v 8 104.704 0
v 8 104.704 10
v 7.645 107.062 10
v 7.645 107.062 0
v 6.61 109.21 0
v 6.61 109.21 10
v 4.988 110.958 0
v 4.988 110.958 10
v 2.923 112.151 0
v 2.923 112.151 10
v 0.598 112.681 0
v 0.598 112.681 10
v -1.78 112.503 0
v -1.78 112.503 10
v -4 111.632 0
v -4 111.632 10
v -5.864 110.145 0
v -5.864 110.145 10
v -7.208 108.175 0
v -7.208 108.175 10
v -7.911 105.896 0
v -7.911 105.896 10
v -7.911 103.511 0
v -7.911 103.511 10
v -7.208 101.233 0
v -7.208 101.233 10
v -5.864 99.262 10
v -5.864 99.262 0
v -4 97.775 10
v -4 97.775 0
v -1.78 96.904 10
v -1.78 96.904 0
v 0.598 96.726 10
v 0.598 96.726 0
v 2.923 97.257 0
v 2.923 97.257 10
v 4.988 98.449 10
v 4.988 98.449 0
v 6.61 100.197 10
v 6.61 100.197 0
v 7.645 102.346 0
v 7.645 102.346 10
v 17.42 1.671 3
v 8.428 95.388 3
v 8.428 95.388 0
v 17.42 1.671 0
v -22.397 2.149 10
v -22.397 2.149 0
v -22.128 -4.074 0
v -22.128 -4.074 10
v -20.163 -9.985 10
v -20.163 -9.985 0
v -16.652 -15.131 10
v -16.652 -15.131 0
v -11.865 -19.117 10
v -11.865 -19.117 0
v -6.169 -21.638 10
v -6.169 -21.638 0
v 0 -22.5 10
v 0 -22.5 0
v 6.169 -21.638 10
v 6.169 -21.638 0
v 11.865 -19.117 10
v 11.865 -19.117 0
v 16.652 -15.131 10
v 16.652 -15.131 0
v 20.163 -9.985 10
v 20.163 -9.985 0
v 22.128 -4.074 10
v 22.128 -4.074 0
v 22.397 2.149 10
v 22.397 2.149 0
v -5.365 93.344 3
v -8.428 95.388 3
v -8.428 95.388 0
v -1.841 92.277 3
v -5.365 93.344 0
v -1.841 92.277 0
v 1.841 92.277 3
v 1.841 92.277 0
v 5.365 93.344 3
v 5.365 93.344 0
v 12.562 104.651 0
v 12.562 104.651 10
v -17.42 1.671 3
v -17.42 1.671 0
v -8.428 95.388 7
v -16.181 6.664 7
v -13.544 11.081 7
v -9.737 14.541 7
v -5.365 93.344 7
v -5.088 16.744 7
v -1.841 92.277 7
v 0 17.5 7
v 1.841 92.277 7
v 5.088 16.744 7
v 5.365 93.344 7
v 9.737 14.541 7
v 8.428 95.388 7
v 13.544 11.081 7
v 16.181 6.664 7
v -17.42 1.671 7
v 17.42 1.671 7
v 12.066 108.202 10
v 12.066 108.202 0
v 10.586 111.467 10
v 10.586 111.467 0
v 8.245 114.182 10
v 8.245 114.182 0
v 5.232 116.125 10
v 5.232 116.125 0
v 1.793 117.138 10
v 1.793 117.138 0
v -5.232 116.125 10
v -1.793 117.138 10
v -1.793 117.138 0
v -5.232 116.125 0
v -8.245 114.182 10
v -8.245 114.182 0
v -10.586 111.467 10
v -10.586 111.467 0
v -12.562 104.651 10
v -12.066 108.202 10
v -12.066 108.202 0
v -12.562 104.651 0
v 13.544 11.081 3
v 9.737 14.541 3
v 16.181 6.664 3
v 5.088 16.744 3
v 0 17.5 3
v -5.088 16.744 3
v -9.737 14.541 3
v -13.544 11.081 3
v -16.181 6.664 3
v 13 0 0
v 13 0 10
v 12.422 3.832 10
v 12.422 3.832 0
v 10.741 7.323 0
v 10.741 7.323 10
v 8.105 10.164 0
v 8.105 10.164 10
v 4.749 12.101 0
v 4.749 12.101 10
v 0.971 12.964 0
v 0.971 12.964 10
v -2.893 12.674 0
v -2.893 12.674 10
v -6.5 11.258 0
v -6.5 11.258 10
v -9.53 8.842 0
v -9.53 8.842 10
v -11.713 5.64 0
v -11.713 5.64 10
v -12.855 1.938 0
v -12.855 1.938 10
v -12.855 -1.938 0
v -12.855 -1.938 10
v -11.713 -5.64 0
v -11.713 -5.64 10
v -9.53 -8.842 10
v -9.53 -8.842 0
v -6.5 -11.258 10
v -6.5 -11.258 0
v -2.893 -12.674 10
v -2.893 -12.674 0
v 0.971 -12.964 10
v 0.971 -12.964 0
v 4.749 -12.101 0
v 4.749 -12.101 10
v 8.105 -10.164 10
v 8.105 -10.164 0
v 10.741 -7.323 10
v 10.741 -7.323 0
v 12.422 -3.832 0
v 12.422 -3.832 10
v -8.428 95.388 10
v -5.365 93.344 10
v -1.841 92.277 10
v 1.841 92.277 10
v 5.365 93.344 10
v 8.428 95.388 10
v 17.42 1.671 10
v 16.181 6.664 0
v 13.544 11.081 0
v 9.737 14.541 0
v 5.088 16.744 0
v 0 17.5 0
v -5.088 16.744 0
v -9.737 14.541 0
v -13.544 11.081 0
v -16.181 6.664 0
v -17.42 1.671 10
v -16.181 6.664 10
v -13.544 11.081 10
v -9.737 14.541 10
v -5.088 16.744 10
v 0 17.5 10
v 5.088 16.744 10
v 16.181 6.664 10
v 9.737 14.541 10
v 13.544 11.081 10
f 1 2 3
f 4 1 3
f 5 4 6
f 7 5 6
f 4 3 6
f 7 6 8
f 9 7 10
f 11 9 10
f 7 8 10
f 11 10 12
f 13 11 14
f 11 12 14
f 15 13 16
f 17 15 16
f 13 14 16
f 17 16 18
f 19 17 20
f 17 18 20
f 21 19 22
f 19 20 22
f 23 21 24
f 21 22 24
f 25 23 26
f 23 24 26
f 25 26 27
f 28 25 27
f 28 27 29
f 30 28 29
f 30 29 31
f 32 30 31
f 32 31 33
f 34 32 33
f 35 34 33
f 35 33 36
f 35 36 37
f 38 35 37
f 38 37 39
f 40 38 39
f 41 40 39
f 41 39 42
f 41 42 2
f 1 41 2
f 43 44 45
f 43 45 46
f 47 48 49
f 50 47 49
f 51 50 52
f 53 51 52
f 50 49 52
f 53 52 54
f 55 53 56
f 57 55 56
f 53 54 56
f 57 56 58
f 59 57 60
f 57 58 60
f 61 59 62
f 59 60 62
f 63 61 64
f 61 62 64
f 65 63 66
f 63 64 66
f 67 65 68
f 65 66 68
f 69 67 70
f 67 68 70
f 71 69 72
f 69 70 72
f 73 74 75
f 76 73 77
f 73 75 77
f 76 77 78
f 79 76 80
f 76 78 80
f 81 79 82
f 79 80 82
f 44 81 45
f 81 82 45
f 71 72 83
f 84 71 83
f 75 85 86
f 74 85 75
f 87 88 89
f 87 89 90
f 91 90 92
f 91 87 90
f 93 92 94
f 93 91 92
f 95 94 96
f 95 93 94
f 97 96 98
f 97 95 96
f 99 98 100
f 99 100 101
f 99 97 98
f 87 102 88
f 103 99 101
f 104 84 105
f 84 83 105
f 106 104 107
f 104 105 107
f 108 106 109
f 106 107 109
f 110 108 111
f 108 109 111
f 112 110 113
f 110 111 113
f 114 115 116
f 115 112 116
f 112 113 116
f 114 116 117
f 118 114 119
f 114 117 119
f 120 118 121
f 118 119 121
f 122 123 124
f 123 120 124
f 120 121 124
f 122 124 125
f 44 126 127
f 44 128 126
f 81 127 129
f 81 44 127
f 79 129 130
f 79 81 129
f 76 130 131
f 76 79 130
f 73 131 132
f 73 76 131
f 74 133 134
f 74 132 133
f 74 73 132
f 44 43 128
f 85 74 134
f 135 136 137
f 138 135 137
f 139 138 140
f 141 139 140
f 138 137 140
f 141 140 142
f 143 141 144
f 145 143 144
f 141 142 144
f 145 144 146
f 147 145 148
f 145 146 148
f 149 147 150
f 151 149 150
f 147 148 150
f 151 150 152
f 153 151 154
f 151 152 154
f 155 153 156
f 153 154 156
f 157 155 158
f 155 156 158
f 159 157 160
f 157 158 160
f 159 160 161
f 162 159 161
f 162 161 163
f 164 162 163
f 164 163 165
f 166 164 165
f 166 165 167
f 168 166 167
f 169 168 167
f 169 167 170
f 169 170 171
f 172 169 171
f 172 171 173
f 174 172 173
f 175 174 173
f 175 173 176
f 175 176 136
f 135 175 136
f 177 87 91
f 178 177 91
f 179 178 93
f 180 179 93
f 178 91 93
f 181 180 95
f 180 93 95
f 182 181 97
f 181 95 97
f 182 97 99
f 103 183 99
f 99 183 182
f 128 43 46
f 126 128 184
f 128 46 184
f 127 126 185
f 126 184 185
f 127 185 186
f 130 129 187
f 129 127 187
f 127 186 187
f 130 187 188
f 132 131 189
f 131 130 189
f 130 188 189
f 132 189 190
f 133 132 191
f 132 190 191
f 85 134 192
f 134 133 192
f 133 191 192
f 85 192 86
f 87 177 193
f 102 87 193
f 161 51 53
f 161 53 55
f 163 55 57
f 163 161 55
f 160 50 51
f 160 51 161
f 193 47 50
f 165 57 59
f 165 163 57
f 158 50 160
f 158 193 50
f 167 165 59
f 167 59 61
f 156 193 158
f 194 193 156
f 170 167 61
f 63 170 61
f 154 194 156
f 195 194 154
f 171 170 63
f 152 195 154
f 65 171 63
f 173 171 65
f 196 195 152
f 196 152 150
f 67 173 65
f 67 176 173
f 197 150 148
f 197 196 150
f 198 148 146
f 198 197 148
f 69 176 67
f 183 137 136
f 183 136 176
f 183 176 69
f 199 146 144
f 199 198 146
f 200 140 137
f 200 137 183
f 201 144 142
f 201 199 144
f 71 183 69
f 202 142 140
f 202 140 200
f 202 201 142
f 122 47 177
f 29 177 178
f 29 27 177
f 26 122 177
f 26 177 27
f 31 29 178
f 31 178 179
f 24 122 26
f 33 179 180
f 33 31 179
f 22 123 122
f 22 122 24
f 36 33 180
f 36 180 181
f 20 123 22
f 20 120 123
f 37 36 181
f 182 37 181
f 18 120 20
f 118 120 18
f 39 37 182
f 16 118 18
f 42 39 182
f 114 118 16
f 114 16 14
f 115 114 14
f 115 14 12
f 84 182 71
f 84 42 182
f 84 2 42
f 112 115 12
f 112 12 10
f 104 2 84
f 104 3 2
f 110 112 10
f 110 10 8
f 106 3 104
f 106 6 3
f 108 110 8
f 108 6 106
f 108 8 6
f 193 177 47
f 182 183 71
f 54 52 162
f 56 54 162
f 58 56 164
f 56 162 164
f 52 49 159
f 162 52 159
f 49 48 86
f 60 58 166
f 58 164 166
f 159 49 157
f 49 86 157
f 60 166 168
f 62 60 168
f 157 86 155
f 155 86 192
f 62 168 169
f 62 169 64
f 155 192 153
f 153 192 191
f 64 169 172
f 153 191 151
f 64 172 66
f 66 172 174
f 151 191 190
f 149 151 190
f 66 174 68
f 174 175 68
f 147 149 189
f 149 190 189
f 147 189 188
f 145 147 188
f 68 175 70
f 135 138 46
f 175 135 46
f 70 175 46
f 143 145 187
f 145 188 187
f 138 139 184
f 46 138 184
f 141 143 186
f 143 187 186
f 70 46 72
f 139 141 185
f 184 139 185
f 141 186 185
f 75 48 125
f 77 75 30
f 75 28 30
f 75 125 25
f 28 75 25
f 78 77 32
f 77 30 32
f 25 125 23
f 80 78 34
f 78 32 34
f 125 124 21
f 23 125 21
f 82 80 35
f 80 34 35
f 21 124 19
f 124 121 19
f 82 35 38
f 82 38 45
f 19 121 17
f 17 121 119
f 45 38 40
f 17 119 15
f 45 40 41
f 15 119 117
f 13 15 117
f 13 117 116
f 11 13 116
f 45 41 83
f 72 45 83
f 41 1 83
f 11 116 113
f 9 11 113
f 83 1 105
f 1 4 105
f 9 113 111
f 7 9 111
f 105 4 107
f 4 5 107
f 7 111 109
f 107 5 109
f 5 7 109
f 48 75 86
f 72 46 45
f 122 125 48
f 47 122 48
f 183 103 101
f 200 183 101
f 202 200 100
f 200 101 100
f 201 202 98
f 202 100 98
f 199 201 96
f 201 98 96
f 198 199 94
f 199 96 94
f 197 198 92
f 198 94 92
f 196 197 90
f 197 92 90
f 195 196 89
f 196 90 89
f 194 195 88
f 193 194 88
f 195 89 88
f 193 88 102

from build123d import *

# Parameters (mm, degrees)
BOSS_EXTRUDE1_DEPTH = 10
CUT_EXTRUDE1_DEPTH  = 3
CUT_EXTRUDE2_START  = -3
CUT_EXTRUDE2_DEPTH  = 3
SKETCH8_R           = 17.5
SKETCH8_R_2         = 12.562549016
BOSS_EXTRUDE3_DEPTH = 10
SKETCH9_R           = 13
SKETCH9_R_2         = 8
CUT_EXTRUDE4_DEPTH  = 120.823194953


with BuildPart() as part:
    # Sketch2 → Boss-Extrude1 (new body)
    with BuildSketch(Plane.XY):
        with BuildLine():
            Line((-12.442858632, 105.897439267), (-22.397145538, 2.148923391))
            ThreePointArc((-22.397145538, 2.148923391), (0, -22.5), (22.397145538, 2.148923391))
            Line((22.397145538, 2.148923391), (12.442858632, 105.897439267))
            ThreePointArc((12.442858632, 105.897439267), (0, 117.203592938), (-12.442858632, 105.897439267))
        make_face()
    extrude(amount=BOSS_EXTRUDE1_DEPTH)

    # Sketch3 → Cut-Extrude1 (cut)
    with BuildSketch(Plane.XY.offset(10)):
        with BuildLine():
            Line((-7.465715179, 105.419900735), (-17.420002085, 1.67138486))
            ThreePointArc((-17.420002085, 1.67138486), (0, -17.5), (17.420002085, 1.67138486))
            Line((17.420002085, 1.67138486), (7.465715179, 105.419900735))
            ThreePointArc((7.465715179, 105.419900735), (0, 112.203592938), (-7.465715179, 105.419900735))
        make_face()
    extrude(amount=-CUT_EXTRUDE1_DEPTH, mode=Mode.SUBTRACT)

    # Sketch5 → Cut-Extrude2 (cut)
    with BuildSketch(Plane(origin=(0, 0, 0), x_dir=(-1, 0, 0), z_dir=(0, 0, -1)).offset(CUT_EXTRUDE2_START)):
        with BuildLine():
            Line((-7.465715179, 105.419900735), (-17.420002085, 1.67138486))
            ThreePointArc((-17.420002085, 1.67138486), (0, -17.5), (17.420002085, 1.67138486))
            Line((17.420002085, 1.67138486), (7.465715179, 105.419900735))
            ThreePointArc((7.465715179, 105.419900735), (0, 112.203592938), (-7.465715179, 105.419900735))
        make_face()
    extrude(amount=CUT_EXTRUDE2_DEPTH, mode=Mode.SUBTRACT)

    # Sketch8 → Boss-Extrude3 (add)
    with BuildSketch(Plane.XY):
        Circle(SKETCH8_R)
        with Locations((0, 104.703592938)):
            Circle(SKETCH8_R_2)
    extrude(amount=BOSS_EXTRUDE3_DEPTH)

    # Sketch9 → Cut-Extrude4 (cut, through all)
    with BuildSketch(Plane.XY.offset(10)):
        Circle(SKETCH9_R)
        with Locations((0, 104.703592938)):
            Circle(SKETCH9_R_2)
    extrude(amount=-CUT_EXTRUDE4_DEPTH, mode=Mode.SUBTRACT)


solid = part.part
